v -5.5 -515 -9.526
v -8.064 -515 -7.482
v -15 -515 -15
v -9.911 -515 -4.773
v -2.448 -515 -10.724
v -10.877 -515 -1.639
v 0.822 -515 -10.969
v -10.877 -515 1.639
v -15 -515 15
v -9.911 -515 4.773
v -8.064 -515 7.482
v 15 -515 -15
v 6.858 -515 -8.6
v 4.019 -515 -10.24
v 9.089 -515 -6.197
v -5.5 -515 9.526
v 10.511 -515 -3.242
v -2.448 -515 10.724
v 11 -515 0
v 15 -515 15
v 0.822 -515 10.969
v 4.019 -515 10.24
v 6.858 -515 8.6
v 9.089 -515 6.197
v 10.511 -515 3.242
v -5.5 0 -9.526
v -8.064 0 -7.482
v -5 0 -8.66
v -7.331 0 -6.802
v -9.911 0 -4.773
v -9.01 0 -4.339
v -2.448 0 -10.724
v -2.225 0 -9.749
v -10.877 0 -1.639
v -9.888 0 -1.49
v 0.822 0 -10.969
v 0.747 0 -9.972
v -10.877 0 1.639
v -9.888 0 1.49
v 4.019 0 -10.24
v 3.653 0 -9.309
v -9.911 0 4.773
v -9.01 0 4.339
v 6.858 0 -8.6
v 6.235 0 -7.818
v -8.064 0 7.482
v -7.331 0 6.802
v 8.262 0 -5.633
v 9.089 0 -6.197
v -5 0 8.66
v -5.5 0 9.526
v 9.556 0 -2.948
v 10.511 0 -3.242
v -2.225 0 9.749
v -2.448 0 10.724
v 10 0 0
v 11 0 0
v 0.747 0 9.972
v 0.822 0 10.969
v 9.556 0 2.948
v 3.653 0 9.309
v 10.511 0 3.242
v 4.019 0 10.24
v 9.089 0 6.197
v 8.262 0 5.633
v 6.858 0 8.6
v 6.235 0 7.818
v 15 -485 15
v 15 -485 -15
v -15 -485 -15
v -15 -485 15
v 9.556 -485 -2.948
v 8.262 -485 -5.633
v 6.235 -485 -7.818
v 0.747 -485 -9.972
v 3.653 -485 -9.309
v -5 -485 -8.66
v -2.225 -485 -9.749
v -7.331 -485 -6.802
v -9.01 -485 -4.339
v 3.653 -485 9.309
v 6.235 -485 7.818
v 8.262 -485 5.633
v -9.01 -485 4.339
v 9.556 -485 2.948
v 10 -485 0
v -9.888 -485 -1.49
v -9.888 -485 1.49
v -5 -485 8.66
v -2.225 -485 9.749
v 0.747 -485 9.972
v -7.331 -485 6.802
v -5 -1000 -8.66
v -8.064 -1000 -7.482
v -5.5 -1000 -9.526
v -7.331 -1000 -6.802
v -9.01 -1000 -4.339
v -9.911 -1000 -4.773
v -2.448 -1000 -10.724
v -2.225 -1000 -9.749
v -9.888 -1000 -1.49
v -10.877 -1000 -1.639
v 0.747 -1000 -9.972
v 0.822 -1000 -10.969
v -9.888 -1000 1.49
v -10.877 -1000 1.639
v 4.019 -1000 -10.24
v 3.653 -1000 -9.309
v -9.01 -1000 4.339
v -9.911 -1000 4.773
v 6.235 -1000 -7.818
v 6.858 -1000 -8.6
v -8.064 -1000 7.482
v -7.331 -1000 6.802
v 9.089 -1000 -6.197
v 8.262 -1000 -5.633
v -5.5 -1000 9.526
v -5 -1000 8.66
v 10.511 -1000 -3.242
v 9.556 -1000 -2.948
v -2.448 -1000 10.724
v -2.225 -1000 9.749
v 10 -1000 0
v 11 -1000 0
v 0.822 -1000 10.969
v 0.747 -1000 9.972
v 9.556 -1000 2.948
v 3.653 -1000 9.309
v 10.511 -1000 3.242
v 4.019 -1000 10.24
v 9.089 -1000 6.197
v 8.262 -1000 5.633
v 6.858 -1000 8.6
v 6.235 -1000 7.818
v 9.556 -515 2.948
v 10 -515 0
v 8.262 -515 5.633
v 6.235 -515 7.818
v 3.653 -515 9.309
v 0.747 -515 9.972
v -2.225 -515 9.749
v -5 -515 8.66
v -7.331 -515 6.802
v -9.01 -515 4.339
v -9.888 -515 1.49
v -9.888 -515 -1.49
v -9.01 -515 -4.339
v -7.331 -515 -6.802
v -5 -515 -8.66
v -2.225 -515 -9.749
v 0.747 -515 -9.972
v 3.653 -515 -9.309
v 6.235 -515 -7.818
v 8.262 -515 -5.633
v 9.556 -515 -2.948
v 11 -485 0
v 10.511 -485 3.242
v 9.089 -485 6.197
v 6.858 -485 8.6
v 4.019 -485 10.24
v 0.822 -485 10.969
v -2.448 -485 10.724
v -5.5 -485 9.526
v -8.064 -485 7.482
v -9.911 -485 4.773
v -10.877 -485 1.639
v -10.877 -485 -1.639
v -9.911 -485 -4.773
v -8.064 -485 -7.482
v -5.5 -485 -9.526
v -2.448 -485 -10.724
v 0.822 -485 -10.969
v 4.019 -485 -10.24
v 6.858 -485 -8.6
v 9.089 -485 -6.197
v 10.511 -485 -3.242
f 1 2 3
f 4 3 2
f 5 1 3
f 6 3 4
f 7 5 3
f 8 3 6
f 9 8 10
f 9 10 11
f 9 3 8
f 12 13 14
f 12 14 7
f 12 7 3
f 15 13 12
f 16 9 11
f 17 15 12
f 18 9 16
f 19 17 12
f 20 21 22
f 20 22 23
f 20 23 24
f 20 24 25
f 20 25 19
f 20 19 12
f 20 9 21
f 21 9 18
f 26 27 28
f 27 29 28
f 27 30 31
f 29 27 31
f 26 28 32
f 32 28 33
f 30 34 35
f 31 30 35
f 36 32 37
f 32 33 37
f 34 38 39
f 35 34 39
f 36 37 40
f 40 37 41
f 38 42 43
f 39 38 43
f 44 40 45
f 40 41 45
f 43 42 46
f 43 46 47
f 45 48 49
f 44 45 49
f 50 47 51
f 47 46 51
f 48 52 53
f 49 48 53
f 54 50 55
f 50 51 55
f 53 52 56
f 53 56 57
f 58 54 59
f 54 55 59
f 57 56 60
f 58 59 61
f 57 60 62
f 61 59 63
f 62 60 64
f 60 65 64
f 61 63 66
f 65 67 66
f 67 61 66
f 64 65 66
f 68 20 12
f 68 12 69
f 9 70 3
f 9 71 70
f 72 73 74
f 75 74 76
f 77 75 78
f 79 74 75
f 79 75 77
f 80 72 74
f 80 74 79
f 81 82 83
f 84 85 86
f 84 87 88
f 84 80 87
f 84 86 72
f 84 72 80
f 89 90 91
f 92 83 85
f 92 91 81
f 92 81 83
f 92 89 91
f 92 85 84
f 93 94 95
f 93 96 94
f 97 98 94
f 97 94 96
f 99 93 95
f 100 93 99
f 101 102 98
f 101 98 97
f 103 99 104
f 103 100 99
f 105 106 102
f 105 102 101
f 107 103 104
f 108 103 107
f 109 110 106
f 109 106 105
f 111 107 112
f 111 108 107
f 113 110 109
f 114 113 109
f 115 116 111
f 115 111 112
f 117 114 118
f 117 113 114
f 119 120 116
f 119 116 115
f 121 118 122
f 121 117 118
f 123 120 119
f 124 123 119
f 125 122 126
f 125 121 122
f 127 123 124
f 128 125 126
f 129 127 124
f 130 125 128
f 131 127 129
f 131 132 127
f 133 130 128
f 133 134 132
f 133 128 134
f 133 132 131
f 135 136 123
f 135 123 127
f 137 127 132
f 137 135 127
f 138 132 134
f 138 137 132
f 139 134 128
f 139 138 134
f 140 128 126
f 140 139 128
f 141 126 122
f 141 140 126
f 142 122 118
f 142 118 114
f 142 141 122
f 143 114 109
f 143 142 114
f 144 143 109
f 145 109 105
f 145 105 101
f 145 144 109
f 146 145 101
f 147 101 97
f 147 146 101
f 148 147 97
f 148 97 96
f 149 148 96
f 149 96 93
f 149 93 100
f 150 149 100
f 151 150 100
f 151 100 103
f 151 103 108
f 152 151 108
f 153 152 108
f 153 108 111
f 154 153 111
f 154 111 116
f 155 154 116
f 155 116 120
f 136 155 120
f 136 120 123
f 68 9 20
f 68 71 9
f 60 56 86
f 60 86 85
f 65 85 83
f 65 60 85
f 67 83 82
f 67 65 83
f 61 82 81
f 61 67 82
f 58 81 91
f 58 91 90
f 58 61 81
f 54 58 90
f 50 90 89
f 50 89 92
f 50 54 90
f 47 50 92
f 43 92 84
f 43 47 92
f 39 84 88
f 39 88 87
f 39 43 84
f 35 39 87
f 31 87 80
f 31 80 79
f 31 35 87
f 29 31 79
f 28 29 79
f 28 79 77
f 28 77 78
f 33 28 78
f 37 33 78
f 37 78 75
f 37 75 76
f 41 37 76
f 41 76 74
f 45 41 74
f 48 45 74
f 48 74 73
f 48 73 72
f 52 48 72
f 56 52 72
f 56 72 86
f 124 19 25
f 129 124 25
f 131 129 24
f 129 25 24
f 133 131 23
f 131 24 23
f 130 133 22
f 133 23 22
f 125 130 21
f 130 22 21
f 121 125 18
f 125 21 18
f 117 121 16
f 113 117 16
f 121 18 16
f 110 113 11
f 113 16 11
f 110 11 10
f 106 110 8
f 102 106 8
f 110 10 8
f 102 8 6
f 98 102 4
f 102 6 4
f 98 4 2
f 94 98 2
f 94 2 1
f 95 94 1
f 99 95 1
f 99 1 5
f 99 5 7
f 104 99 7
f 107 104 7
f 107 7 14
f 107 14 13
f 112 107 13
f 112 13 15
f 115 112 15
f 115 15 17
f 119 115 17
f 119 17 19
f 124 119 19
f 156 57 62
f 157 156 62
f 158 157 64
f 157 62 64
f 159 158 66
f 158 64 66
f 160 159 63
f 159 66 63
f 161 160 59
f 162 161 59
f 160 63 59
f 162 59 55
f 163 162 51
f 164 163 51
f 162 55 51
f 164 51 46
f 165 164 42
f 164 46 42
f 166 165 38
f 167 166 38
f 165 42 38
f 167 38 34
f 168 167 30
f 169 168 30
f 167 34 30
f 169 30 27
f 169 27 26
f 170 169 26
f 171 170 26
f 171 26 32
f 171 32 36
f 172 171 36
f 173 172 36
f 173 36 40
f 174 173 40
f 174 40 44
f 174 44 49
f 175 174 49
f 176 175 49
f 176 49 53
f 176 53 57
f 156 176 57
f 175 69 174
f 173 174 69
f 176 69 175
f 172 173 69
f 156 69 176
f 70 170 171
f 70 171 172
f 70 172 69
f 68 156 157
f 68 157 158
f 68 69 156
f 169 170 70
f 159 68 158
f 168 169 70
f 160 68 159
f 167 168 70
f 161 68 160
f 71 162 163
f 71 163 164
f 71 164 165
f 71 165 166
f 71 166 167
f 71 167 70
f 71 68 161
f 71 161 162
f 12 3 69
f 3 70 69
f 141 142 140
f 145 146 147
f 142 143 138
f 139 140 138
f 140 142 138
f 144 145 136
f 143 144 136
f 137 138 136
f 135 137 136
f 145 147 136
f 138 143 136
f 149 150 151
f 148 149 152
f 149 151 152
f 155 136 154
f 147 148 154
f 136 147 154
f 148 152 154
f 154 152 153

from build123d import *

# Parameters (mm, degrees)
F0_R          = 11
F0_R_2        = 10
F1_DEPTH      = 1000
F3_DEPTH      = 15
F3_DEPTH_BACK = 15


with BuildPart() as f1:
    # F0 (on Front) → F1 (new body)
    with BuildSketch(Plane.XZ):
        Circle(F0_R)
        Circle(F0_R_2, mode=Mode.SUBTRACT)
    extrude(amount=F1_DEPTH)

    # F2 (on Top) → F3 (join, two sides)
    with BuildSketch(Plane.XY) as f3_sk:
        Polygon((-15, -515), (15, -515), (15, -485), (0, -485), (-15, -485), align=None)
    extrude(amount=F3_DEPTH)
    extrude(f3_sk.sketch, amount=-F3_DEPTH_BACK)


solid = f1.part
